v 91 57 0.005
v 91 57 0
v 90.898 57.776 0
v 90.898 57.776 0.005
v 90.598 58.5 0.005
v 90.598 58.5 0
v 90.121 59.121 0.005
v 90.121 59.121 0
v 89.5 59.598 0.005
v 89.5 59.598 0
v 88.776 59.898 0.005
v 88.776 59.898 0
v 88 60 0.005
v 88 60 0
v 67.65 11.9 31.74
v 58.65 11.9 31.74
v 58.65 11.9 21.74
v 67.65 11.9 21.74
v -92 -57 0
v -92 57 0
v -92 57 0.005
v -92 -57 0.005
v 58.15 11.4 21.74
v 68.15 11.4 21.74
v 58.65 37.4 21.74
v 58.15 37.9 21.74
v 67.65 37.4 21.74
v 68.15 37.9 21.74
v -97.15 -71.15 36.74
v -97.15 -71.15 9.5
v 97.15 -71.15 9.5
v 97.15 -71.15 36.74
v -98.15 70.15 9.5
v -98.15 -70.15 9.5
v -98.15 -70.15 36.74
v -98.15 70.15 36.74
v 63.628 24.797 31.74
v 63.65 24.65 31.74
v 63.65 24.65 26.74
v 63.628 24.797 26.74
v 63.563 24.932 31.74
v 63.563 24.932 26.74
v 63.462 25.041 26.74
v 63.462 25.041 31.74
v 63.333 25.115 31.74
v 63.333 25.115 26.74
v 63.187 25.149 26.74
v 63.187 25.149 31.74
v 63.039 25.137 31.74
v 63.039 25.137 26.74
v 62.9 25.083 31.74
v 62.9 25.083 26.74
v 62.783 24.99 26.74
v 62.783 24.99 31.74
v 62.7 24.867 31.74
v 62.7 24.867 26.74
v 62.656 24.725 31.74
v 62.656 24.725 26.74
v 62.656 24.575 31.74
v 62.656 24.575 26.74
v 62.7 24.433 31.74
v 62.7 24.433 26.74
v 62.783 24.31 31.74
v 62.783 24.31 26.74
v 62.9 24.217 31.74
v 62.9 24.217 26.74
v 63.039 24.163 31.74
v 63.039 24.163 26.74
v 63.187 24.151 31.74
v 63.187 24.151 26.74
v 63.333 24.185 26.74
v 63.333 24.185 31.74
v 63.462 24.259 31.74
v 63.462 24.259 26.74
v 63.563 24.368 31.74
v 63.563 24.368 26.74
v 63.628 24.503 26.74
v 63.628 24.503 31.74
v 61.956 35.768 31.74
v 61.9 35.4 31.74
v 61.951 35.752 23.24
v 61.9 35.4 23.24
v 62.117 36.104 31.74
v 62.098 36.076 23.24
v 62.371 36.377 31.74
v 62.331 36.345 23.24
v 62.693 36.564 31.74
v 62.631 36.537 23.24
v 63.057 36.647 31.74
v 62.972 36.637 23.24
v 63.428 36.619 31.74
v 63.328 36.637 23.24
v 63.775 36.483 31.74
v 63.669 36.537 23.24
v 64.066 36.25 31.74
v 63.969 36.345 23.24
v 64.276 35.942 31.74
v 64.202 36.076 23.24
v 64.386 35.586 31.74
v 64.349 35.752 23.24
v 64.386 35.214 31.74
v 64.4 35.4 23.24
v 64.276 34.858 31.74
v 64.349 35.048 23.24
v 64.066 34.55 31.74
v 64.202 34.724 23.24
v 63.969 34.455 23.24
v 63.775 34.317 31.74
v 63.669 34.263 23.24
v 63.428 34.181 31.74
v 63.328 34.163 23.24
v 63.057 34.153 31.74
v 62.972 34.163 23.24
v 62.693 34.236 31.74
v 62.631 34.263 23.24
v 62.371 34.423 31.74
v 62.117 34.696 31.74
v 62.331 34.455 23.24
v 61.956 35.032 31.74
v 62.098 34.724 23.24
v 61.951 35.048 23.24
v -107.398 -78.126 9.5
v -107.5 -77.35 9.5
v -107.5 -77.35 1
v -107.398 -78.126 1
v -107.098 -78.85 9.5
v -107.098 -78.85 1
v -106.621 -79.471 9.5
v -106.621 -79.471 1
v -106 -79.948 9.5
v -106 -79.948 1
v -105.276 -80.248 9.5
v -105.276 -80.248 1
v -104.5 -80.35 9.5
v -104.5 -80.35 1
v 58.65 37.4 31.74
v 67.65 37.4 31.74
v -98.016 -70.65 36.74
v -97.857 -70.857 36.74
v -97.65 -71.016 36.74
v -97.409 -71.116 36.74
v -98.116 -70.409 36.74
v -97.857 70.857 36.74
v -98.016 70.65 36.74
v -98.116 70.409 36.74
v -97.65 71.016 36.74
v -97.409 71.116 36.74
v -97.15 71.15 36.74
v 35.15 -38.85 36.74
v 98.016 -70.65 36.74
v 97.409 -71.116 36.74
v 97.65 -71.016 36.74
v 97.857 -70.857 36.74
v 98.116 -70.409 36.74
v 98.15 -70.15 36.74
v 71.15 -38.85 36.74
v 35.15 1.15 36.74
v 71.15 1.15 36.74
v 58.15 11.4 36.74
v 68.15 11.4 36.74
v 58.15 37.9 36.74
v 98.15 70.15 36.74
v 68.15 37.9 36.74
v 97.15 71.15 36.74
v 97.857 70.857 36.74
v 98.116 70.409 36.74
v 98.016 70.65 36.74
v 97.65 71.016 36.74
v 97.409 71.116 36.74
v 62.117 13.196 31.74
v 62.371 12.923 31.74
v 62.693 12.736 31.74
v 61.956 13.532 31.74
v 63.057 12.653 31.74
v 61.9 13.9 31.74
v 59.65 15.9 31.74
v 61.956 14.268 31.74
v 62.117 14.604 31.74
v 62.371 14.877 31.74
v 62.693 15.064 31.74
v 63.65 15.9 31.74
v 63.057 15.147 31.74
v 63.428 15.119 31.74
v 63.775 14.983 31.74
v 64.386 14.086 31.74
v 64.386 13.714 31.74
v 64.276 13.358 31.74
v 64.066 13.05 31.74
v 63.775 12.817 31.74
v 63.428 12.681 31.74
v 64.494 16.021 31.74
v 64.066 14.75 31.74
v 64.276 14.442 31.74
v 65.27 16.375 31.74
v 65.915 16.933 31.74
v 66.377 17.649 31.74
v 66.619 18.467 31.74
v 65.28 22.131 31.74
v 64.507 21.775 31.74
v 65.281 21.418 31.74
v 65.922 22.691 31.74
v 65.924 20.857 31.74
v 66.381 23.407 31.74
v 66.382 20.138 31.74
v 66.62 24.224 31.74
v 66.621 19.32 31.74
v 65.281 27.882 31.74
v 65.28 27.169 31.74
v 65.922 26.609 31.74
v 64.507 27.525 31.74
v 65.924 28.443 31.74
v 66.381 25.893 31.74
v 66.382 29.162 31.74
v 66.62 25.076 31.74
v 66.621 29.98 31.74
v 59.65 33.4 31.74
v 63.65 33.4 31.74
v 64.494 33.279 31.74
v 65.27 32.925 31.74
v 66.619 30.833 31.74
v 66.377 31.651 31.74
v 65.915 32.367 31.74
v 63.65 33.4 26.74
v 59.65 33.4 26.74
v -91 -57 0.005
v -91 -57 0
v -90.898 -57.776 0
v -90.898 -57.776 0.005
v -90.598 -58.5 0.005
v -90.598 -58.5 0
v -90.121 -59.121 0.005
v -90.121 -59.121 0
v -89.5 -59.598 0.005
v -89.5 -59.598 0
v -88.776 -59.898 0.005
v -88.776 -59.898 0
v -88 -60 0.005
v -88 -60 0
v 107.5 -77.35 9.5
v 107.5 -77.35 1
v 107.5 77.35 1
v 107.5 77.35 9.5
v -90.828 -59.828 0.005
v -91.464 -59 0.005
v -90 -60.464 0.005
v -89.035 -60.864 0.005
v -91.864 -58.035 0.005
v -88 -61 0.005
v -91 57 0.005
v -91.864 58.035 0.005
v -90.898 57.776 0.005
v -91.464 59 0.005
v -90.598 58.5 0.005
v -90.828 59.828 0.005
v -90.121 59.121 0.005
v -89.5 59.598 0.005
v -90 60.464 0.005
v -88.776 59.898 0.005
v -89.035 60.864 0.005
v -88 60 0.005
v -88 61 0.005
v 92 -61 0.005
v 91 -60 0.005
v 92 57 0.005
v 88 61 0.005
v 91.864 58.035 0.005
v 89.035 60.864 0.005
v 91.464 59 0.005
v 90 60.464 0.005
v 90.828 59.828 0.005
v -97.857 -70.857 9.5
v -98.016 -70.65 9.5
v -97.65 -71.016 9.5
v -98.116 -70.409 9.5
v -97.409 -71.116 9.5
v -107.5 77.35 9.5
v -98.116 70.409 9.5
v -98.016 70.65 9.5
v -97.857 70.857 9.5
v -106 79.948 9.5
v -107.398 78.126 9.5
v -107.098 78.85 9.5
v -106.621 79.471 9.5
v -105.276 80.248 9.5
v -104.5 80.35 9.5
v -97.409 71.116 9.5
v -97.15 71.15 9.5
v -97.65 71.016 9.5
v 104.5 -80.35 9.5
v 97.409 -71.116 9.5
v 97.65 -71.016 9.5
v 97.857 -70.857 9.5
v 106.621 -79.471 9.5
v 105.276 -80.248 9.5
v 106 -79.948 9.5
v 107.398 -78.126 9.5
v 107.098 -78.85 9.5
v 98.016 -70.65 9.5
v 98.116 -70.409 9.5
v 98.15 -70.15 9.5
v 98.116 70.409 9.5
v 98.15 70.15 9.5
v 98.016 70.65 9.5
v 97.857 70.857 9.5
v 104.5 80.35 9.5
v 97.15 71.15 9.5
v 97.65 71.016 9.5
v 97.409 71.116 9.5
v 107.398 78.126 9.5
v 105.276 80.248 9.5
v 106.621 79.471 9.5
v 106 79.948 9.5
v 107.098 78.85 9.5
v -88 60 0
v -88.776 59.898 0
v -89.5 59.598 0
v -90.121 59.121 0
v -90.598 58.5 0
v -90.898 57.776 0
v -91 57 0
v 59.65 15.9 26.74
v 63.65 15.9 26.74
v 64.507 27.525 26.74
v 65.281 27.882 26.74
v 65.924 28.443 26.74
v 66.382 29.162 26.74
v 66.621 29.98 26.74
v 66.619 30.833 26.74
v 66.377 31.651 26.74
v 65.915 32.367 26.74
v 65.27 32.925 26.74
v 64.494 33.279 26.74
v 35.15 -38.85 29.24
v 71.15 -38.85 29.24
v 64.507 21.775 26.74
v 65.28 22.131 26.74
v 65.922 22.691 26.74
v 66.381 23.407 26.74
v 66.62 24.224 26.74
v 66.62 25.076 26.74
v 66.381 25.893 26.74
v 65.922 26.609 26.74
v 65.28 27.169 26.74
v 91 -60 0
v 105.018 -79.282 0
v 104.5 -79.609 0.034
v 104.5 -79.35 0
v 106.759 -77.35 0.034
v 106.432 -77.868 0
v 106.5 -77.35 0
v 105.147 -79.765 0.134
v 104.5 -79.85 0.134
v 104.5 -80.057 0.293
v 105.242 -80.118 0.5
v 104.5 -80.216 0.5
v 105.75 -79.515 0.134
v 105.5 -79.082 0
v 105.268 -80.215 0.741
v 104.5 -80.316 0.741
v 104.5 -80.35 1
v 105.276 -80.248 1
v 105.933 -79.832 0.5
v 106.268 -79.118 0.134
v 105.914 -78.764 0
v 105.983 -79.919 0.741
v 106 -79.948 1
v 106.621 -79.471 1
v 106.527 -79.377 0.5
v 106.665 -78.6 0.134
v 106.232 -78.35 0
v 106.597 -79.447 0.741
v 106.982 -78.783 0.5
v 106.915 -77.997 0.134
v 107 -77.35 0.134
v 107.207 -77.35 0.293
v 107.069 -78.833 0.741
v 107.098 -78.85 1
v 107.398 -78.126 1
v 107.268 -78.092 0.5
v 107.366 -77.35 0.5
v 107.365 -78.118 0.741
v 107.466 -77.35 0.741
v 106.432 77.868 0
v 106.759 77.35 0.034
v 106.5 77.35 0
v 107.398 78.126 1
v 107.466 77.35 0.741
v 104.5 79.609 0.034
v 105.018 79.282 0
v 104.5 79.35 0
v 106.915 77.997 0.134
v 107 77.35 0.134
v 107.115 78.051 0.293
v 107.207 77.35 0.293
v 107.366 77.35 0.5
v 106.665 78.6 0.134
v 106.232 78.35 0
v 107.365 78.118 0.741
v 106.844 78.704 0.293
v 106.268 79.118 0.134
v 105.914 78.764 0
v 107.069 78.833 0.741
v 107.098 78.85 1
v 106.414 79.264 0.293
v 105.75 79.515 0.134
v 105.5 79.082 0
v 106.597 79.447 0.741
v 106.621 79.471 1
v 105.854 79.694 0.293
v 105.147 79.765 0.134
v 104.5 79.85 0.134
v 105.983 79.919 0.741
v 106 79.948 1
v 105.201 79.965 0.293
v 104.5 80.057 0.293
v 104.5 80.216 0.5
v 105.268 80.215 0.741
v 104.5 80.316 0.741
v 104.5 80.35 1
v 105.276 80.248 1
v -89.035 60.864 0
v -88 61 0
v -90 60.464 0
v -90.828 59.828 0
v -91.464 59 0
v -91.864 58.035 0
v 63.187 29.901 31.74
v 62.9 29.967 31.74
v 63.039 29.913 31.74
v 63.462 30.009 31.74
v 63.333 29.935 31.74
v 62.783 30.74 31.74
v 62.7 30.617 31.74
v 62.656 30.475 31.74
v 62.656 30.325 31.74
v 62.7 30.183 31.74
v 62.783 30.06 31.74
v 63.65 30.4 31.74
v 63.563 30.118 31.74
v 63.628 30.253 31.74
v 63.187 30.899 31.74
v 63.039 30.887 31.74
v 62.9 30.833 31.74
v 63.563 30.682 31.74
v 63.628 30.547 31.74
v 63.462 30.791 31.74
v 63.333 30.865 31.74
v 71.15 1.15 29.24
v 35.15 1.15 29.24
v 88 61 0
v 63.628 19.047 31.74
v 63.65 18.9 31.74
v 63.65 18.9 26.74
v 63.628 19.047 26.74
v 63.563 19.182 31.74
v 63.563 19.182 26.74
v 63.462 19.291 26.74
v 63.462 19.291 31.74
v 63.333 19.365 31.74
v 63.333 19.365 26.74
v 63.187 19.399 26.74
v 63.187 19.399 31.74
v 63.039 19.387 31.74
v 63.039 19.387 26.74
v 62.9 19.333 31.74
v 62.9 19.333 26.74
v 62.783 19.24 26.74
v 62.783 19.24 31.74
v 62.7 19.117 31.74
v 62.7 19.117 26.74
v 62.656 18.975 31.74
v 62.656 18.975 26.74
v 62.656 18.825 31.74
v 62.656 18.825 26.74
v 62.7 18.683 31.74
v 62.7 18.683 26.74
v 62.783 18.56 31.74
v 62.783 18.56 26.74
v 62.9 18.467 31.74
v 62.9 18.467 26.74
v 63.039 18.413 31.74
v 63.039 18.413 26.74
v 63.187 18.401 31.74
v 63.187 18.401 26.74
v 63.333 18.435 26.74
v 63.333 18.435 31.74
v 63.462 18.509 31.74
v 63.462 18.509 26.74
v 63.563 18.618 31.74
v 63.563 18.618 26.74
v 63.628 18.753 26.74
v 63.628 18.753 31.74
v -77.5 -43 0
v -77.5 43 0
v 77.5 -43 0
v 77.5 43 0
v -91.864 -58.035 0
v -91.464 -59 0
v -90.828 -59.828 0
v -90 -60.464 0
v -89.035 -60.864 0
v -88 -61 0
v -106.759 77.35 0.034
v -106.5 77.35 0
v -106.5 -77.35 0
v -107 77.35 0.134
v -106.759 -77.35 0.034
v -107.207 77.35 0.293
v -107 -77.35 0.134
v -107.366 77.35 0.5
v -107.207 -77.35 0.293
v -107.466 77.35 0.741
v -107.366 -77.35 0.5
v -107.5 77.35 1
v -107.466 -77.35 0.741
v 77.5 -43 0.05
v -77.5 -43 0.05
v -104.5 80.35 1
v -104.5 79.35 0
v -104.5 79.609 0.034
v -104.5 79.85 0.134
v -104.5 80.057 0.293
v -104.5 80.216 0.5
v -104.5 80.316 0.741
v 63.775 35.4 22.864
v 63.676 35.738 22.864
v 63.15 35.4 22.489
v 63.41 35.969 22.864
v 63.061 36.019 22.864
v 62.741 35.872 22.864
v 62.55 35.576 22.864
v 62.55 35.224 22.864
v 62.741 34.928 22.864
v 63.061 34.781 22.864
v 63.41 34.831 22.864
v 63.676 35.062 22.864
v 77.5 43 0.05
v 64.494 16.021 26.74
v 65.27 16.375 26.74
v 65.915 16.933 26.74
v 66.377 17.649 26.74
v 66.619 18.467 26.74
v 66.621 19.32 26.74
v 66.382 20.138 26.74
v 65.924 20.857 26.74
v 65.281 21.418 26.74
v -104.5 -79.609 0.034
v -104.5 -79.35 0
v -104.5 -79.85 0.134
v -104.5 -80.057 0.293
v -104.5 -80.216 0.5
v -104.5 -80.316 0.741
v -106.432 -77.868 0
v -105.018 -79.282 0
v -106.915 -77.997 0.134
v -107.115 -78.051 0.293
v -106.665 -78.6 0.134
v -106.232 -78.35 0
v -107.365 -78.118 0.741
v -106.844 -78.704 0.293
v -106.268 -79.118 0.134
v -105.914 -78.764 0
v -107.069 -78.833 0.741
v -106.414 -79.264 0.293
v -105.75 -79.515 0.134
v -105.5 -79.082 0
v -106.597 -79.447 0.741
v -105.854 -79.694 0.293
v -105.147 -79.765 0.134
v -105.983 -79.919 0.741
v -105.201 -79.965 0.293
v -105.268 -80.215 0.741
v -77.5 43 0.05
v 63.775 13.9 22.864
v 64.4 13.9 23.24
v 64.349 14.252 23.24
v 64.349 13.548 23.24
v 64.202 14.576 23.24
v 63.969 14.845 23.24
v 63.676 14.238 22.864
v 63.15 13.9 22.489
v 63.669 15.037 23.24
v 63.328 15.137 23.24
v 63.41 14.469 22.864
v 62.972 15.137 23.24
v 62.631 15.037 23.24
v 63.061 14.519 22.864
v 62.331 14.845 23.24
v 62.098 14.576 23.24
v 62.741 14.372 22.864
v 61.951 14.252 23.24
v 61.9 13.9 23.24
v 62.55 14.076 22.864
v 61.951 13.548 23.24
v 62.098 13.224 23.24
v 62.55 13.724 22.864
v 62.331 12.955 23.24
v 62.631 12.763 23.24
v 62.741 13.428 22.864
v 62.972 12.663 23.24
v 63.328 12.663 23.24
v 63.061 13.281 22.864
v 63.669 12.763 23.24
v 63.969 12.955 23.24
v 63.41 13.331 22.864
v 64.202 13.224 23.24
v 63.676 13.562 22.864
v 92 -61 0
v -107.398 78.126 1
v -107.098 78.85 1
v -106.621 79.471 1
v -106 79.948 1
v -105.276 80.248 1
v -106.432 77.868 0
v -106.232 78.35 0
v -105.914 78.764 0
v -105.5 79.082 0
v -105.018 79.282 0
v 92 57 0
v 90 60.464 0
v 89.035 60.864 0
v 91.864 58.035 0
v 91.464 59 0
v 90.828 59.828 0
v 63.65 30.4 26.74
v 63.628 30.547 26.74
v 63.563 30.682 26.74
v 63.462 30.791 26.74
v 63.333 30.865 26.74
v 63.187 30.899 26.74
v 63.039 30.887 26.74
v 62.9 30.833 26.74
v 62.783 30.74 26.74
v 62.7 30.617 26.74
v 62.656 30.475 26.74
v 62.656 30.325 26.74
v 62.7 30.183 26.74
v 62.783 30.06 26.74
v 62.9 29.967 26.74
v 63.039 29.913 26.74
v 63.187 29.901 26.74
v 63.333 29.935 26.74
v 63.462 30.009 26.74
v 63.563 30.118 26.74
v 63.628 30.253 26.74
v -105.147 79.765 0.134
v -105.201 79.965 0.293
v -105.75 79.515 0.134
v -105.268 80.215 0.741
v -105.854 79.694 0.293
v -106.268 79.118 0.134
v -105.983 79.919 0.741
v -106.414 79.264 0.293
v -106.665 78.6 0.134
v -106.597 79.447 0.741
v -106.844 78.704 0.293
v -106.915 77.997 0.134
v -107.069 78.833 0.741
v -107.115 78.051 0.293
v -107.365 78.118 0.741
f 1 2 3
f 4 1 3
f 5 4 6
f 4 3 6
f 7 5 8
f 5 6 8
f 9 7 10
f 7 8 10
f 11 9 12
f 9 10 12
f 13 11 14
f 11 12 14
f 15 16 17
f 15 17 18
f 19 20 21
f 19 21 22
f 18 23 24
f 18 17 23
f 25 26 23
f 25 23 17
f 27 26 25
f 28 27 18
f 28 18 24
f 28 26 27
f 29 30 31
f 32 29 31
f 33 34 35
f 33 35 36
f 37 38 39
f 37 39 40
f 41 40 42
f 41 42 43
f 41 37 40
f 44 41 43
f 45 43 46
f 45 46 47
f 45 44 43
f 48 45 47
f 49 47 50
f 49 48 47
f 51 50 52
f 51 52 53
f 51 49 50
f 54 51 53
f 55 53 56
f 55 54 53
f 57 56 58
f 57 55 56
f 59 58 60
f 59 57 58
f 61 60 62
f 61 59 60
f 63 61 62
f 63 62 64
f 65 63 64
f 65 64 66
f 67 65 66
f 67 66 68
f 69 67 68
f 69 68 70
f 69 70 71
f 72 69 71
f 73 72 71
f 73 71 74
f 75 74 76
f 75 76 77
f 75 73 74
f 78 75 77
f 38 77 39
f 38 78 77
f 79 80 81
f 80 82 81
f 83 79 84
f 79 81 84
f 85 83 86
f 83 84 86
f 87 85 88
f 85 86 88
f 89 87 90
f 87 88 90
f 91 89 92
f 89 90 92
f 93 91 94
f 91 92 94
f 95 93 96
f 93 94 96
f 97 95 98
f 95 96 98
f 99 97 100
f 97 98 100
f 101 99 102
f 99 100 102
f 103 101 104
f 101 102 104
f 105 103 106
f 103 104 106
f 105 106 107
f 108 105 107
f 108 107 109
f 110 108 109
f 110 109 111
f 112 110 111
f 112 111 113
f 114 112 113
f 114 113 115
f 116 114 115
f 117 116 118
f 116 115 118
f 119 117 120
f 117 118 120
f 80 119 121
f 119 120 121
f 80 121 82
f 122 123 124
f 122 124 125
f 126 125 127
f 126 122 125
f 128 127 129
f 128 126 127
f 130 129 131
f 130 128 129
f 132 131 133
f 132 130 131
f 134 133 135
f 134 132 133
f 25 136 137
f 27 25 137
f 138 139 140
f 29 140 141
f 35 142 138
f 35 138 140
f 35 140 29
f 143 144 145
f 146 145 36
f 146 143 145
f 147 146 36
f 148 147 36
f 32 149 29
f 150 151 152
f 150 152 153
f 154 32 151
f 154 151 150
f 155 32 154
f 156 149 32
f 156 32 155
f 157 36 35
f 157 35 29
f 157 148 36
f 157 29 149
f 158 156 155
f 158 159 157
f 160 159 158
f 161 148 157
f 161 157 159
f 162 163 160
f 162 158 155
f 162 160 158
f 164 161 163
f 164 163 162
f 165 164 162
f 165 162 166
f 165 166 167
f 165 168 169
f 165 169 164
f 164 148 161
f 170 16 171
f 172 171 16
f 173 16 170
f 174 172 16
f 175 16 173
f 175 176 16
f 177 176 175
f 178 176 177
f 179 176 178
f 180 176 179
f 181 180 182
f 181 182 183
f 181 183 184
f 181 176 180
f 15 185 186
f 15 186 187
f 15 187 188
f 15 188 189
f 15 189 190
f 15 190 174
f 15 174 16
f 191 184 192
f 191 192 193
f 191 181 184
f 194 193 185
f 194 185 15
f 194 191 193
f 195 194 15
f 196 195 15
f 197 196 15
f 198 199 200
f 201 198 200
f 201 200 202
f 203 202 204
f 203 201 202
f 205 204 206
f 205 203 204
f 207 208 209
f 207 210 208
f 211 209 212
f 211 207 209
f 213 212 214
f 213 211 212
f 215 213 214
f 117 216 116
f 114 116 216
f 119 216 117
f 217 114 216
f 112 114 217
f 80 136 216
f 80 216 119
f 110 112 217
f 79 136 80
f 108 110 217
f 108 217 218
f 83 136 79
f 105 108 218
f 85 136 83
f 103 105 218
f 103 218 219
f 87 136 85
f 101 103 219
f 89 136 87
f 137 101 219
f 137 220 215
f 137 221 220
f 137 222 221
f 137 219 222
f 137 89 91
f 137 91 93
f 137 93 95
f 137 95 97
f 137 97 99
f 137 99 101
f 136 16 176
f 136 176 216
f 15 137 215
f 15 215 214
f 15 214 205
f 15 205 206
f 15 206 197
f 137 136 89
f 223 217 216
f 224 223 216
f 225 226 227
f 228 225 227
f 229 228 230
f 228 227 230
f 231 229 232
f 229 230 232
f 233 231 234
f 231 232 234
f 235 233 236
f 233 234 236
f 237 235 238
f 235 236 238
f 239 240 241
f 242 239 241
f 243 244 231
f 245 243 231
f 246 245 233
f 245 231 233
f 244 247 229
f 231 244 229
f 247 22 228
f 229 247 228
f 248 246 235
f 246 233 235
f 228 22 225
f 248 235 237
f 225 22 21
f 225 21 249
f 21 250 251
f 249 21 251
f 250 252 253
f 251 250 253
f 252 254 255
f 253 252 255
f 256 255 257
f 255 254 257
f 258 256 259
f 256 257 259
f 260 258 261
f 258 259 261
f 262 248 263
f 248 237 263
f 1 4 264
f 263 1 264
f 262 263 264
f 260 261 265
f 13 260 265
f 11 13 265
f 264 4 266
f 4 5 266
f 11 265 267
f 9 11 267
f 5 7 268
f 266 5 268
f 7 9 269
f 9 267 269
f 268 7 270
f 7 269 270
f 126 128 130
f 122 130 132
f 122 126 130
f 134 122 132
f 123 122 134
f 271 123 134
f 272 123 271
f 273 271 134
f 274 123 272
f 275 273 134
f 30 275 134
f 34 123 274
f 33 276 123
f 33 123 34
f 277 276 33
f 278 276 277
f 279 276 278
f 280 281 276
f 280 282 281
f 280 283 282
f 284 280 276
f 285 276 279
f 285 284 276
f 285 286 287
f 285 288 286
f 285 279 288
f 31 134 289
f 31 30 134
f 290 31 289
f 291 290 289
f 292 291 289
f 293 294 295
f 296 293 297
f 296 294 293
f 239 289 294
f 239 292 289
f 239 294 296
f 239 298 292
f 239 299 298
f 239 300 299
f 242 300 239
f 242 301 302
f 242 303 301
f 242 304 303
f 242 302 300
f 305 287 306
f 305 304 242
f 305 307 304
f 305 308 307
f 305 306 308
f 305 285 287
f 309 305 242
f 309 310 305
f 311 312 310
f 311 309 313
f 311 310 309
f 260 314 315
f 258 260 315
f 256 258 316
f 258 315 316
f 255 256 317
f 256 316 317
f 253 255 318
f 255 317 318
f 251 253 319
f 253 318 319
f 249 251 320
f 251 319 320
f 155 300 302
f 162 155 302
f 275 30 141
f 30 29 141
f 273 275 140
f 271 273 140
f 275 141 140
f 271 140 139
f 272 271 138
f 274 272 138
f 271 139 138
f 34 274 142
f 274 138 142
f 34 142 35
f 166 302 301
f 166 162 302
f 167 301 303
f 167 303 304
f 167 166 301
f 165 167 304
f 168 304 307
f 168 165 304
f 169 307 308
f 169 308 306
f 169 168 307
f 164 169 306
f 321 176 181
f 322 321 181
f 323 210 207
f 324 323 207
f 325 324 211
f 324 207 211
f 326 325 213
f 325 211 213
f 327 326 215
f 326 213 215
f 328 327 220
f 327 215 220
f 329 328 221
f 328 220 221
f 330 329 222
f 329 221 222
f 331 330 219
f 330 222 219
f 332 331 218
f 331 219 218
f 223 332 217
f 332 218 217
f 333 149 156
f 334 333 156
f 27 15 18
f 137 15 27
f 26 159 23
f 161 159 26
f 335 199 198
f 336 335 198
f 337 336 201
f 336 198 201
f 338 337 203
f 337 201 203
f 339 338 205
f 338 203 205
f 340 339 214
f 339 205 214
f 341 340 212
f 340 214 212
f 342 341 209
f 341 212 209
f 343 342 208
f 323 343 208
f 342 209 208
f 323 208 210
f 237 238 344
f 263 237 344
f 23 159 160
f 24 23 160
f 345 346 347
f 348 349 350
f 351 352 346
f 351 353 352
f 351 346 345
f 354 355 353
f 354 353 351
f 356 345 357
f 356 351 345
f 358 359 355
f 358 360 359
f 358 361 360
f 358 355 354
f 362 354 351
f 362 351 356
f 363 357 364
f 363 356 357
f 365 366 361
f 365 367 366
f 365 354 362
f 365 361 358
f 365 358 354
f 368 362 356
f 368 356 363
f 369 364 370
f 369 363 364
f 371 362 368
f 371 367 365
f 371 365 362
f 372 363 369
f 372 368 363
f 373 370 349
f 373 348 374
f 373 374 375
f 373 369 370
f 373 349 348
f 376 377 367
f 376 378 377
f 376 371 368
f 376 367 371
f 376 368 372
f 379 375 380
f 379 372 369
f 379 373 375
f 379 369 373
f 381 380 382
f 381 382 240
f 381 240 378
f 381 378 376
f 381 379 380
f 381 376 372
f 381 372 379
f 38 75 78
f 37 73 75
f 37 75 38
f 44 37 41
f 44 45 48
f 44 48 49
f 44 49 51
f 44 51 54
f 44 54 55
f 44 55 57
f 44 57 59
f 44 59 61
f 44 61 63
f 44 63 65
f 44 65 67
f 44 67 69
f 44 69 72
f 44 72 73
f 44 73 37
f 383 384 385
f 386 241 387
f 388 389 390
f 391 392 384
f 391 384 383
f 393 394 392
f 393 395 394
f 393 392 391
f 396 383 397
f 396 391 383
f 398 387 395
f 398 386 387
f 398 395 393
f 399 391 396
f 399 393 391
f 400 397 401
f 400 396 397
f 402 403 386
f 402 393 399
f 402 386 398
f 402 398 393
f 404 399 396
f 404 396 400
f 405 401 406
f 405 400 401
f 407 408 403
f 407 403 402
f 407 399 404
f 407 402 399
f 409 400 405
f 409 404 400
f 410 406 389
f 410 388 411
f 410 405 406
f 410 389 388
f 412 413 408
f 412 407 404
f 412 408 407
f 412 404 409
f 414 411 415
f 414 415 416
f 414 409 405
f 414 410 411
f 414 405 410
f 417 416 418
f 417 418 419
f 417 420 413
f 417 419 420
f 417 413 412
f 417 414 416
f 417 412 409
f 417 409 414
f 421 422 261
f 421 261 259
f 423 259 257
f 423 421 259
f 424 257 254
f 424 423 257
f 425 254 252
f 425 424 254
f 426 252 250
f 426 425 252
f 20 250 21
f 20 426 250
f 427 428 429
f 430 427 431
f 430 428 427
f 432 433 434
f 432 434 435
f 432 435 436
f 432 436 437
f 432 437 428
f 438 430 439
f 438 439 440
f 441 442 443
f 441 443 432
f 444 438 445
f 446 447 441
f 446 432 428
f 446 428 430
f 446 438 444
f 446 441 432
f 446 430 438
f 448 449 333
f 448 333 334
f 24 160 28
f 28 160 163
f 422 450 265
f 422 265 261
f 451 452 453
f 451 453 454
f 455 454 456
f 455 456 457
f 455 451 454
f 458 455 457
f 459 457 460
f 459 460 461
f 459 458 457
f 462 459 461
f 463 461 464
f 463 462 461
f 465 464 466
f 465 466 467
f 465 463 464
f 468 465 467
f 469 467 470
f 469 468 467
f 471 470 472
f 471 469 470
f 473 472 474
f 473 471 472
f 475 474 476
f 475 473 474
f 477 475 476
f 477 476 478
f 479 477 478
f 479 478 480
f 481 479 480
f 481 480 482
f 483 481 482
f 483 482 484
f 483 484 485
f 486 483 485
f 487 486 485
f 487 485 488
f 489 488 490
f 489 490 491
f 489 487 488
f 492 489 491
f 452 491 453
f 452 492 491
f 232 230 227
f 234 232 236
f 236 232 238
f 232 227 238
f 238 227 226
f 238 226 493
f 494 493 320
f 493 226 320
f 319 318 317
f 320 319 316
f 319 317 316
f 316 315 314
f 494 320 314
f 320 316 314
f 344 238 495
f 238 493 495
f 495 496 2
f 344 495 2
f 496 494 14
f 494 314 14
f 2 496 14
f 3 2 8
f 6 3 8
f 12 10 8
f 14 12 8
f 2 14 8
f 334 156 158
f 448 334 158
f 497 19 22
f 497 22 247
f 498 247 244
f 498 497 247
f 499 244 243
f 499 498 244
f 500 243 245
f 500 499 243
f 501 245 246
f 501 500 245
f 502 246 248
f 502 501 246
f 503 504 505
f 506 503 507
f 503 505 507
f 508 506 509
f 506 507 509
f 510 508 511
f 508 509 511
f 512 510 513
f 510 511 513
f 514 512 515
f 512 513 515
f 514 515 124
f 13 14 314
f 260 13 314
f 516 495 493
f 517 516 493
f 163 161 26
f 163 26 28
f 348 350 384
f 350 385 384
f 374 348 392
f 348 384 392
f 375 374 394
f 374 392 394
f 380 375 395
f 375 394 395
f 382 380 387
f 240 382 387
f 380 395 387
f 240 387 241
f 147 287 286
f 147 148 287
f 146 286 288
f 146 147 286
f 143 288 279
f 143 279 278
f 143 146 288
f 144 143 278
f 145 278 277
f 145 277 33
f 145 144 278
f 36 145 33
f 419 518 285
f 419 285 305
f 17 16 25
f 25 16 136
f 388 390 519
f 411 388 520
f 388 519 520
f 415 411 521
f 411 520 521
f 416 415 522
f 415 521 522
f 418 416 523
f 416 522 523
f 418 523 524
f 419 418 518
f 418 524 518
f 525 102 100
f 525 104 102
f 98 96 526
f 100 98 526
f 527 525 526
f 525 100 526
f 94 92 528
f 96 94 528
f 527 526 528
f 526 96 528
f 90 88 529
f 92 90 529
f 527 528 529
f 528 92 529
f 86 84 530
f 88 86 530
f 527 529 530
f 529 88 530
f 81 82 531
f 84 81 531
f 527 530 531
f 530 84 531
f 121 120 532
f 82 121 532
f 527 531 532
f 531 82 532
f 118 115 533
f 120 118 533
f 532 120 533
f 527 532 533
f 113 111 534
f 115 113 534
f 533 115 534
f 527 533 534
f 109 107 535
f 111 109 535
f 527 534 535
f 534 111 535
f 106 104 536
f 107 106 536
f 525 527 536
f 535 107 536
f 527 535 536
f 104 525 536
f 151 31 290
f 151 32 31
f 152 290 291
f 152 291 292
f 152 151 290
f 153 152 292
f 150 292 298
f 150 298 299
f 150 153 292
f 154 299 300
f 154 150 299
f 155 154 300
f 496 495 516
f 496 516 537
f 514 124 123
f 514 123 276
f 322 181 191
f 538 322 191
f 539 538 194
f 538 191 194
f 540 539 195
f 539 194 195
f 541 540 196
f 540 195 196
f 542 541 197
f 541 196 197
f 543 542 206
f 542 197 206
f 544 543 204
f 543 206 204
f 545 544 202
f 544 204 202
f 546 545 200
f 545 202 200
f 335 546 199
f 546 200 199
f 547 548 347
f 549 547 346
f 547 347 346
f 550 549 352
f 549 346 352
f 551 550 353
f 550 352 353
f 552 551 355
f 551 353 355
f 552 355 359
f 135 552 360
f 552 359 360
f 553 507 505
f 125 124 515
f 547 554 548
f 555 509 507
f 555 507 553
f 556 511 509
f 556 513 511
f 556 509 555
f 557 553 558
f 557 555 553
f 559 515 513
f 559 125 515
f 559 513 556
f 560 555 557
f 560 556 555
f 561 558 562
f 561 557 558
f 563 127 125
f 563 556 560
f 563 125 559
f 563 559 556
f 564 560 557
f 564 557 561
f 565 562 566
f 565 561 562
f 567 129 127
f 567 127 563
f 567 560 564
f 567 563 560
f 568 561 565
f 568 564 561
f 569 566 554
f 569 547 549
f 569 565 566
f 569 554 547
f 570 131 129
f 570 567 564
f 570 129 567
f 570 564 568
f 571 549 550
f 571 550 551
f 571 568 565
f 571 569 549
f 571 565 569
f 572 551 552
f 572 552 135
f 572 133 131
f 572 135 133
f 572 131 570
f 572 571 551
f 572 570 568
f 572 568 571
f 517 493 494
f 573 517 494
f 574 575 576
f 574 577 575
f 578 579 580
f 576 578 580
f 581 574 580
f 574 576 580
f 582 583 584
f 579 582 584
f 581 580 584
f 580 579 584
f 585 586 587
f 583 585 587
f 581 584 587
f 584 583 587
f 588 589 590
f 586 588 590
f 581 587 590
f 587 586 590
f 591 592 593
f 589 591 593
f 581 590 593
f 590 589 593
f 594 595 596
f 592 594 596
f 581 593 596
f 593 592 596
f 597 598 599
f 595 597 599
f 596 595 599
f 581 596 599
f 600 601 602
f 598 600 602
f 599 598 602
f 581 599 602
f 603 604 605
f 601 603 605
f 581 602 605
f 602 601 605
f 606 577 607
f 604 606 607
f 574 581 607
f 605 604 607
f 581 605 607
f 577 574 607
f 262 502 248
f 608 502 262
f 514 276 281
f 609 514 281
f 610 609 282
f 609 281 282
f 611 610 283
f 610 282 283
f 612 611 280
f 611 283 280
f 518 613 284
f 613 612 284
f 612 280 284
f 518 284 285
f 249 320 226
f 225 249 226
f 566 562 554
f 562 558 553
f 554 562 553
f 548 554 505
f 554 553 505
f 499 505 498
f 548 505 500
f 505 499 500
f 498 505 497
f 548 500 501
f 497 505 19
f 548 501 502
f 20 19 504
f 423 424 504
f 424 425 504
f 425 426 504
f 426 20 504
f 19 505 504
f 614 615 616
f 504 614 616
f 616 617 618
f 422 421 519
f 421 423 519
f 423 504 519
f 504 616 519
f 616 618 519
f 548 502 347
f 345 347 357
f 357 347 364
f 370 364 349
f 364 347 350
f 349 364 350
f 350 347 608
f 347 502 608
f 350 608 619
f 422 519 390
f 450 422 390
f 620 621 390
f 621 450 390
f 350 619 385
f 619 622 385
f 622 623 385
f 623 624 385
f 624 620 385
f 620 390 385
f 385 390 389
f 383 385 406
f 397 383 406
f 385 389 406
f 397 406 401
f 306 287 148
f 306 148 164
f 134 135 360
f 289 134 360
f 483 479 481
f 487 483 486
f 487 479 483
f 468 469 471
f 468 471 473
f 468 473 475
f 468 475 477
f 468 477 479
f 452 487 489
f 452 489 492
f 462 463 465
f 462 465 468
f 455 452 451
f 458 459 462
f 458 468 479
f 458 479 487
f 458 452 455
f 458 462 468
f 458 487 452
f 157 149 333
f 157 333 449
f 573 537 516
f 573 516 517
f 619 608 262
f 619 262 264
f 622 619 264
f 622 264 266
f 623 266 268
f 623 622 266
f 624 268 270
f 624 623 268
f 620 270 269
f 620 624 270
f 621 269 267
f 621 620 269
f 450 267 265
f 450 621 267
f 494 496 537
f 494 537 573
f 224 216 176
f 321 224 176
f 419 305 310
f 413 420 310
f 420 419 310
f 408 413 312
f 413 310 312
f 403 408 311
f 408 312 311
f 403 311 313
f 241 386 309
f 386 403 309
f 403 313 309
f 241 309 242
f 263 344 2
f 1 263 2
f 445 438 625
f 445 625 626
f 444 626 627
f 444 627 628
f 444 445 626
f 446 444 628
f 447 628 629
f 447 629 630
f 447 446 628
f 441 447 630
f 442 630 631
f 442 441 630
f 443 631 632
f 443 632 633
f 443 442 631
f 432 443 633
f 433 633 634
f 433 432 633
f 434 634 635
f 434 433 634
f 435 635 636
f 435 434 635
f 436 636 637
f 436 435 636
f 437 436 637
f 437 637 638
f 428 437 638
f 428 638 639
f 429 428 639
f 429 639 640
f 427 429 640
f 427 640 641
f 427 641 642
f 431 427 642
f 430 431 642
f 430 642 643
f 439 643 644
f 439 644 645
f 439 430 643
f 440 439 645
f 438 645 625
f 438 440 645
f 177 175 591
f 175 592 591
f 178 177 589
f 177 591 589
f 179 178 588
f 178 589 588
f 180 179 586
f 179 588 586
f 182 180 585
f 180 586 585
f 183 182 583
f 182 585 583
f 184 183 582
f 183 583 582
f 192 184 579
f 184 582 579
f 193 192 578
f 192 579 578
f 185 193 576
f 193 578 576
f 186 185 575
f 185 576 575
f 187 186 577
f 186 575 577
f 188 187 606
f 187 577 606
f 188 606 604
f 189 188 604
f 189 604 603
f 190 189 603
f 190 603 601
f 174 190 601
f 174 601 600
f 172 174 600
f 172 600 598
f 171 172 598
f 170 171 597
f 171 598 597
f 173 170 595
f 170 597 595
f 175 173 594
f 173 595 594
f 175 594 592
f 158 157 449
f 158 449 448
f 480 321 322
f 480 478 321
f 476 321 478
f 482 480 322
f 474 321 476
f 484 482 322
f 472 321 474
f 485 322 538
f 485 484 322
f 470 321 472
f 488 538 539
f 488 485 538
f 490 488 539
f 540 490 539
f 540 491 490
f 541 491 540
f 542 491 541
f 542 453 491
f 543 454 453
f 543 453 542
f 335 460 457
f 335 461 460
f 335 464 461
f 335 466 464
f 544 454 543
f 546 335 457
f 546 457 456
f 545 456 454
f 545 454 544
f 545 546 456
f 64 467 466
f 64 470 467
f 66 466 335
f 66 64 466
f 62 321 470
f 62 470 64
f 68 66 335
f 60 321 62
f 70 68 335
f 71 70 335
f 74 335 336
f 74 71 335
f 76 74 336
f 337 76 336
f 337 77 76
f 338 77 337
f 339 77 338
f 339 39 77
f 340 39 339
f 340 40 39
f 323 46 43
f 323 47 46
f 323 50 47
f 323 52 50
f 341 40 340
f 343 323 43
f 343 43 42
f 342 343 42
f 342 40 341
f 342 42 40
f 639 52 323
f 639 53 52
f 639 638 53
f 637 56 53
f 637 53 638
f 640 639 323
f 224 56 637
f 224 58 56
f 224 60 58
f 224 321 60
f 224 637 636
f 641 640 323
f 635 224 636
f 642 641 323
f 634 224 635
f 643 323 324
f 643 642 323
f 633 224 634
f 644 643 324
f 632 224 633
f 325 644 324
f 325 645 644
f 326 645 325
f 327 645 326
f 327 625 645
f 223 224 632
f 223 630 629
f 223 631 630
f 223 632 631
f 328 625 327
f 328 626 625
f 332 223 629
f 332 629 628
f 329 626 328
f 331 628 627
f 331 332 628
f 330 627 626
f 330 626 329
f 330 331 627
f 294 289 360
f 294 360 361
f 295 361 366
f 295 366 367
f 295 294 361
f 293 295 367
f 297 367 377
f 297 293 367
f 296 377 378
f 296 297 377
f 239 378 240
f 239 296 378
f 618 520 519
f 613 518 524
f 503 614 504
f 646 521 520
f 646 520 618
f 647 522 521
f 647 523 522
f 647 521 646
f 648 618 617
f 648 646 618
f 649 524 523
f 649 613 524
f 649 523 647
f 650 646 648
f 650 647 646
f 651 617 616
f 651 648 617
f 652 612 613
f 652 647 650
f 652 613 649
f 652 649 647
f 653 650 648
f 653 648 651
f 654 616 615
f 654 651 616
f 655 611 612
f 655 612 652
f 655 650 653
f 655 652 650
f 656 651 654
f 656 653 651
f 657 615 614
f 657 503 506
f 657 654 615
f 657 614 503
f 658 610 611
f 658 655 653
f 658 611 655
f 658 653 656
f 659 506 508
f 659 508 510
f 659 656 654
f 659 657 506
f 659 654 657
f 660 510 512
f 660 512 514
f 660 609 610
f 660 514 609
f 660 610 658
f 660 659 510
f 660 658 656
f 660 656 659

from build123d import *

# Parameters (mm, degrees)
IZIM1_W                     = 215
IZIM1_H                     = 160.7
Y_KSEKLIK_EKSTR_ZYON1_DEPTH = 9.5
IZIM2_W                     = 196.3
IZIM2_H                     = 142.3
Y_KSEKLIK_EKSTR_ZYON2_DEPTH = 27.24
IZIM3_W                     = 10
IZIM3_H                     = 26.5
IZIM3_W_2                   = 9
IZIM3_H_2                   = 25.5
KES_EKSTR_ZYON1_DEPTH       = 15
IZIM4_W                     = 9
IZIM4_H                     = 25.5
KES_EKSTR_ZYON2_DEPTH       = 5
IZIM5_R                     = 0.5
KES_EKSTR_ZYON3_DEPTH       = 5
M3_DI_LI_DELIK1_D           = 2.5
M3_DI_LI_DELIK1_DEPTH       = 8.5
M3_DI_LI_DELIK1_TIP         = 0.751075774
IZIM8_W                     = 155
IZIM8_H                     = 86
KES_EKSTR_ZYON4_DEPTH       = 0.05
KES_EKSTR_ZYON5_DEPTH       = 0.005
RADYUS1_R                   = 3
RADYUS2_R                   = 1
IZIM10_W                    = 36
IZIM10_H                    = 40
KES_EKSTR_ZYON6_DEPTH       = 7.5
RADYUS3_R                   = 1


with BuildPart() as part:
    # Çizim1 → Yükseklik-Ekstrüzyon1 (new body)
    with BuildSketch(Plane.XY):
        Rectangle(IZIM1_W, IZIM1_H)
    extrude(amount=Y_KSEKLIK_EKSTR_ZYON1_DEPTH)

    # Çizim2 → Yükseklik-Ekstrüzyon2 (add)
    with BuildSketch(Plane.XY.offset(9.5)):
        Rectangle(IZIM2_W, IZIM2_H)
    extrude(amount=Y_KSEKLIK_EKSTR_ZYON2_DEPTH)

    # Çizim3 → Kes-Ekstrüzyon1 (cut)
    with BuildSketch(Plane.XY.offset(36.74)):
        with Locations((63.15, 24.65)):
            Rectangle(IZIM3_W, IZIM3_H)
        with Locations((63.15, 24.65)):
            Rectangle(IZIM3_W_2, IZIM3_H_2, mode=Mode.SUBTRACT)
    extrude(amount=-KES_EKSTR_ZYON1_DEPTH, mode=Mode.SUBTRACT)

    # Çizim4 → Kes-Ekstrüzyon2 (cut)
    with BuildSketch(Plane.XY.offset(36.74)):
        with Locations((63.15, 24.65)):
            Rectangle(IZIM4_W, IZIM4_H)
    extrude(amount=-KES_EKSTR_ZYON2_DEPTH, mode=Mode.SUBTRACT)

    # Çizim5 → Kes-Ekstrüzyon3 (cut)
    with BuildSketch(Plane.XY.offset(31.74)):
        with BuildLine():
            Line((59.65, 33.4), (59.65, 15.9))
            Line((59.65, 15.9), (63.65, 15.9))
            ThreePointArc((63.65, 15.9), (66.618585522, 18.466987298), (64.506956825, 21.775))
            ThreePointArc((64.506956825, 21.775), (66.65, 24.65), (64.506956825, 27.525))
            ThreePointArc((64.506956825, 27.525), (66.618585522, 30.833012702), (63.65, 33.4))
            Line((63.65, 33.4), (59.65, 33.4))
        make_face()
        with Locations((63.15, 30.4)):
            Circle(IZIM5_R, mode=Mode.SUBTRACT)
        with Locations((63.15, 18.9)):
            Circle(IZIM5_R, mode=Mode.SUBTRACT)
        with Locations((63.15, 24.65)):
            Circle(IZIM5_R, mode=Mode.SUBTRACT)
    extrude(amount=-KES_EKSTR_ZYON3_DEPTH, mode=Mode.SUBTRACT)

    # M3 Dişli Delik1
    with Locations(Plane.XY.offset(31.74)):
        with Locations((63.15, 35.4), (63.15, 13.9)):
            Hole(M3_DI_LI_DELIK1_D / 2, depth=M3_DI_LI_DELIK1_DEPTH)
            with Locations((0, 0, -(M3_DI_LI_DELIK1_DEPTH + M3_DI_LI_DELIK1_TIP / 2))):  # 118° drill point
                Cone(0, M3_DI_LI_DELIK1_D / 2, M3_DI_LI_DELIK1_TIP, mode=Mode.SUBTRACT)

    # Çizim8 → Kes-Ekstrüzyon4 (cut)
    with BuildSketch(Plane(origin=(0, 0, 0), x_dir=(-1, 0, 0), z_dir=(0, 0, -1))):
        Rectangle(IZIM8_W, IZIM8_H)
    extrude(amount=-KES_EKSTR_ZYON4_DEPTH, mode=Mode.SUBTRACT)

    # Çizim9 → Kes-Ekstrüzyon5 (cut)
    with BuildSketch(Plane(origin=(0, 0, 0), x_dir=(-1, 0, 0), z_dir=(0, 0, -1))):
        with BuildLine():
            Line((-88, 61), (88, 61))
            ThreePointArc((88, 61), (90.828427125, 59.828427125), (92, 57))
            Line((92, 57), (92, -57))
            ThreePointArc((92, -57), (90.828427125, -59.828427125), (88, -61))
            Line((88, -61), (-92, -61))
            Line((-92, -61), (-92, 57))
            ThreePointArc((-92, 57), (-90.828427125, 59.828427125), (-88, 61))
        make_face()
        with BuildLine():
            Line((-88, 60), (88, 60))
            ThreePointArc((88, 60), (90.121320344, 59.121320344), (91, 57))
            Line((91, 57), (91, -57))
            ThreePointArc((91, -57), (90.121320344, -59.121320344), (88, -60))
            Line((88, -60), (-91, -60))
            Line((-91, -60), (-91, 57))
            ThreePointArc((-91, 57), (-90.121320344, 59.121320344), (-88, 60))
        make_face(mode=Mode.SUBTRACT)
    extrude(amount=-KES_EKSTR_ZYON5_DEPTH, mode=Mode.SUBTRACT)

    # Radyus1
    radyus1_edges = [part.edges().sort_by_distance(p)[0] for p in [
        (107.5, -80.35, 4.75),
        (-107.5, -80.35, 4.75),
        (-107.5, 80.35, 4.75),
        (107.5, 80.35, 4.75),
    ]]
    fillet(radyus1_edges, radius=RADYUS1_R)

    # Radyus2
    radyus2_edges = [part.edges().sort_by_distance(p)[0] for p in [
        (107.5, 0, 0),
        (0, -80.35, 0),
        (-107.5, 0, 0),
        (0, 80.35, 0),
        (106.621320344, 79.471320344, 0),
        (-106.621320344, 79.471320344, 0),
        (-106.621320344, -79.471320344, 0),
        (106.621320344, -79.471320344, 0),
    ]]
    fillet(radyus2_edges, radius=RADYUS2_R)

    # Çizim10 → Kes-Ekstrüzyon6 (cut)
    with BuildSketch(Plane.XY.offset(36.74)):
        with Locations((53.15, -18.85)):
            Rectangle(IZIM10_W, IZIM10_H)
    extrude(amount=-KES_EKSTR_ZYON6_DEPTH, mode=Mode.SUBTRACT)

    # Radyus3
    radyus3_edges = [part.edges().sort_by_distance(p)[0] for p in [
        (98.15, -71.15, 23.12),
        (98.15, 71.15, 23.12),
        (-98.15, 71.15, 23.12),
        (-98.15, -71.15, 23.12),
    ]]
    fillet(radyus3_edges, radius=RADYUS3_R)


solid = part.part
